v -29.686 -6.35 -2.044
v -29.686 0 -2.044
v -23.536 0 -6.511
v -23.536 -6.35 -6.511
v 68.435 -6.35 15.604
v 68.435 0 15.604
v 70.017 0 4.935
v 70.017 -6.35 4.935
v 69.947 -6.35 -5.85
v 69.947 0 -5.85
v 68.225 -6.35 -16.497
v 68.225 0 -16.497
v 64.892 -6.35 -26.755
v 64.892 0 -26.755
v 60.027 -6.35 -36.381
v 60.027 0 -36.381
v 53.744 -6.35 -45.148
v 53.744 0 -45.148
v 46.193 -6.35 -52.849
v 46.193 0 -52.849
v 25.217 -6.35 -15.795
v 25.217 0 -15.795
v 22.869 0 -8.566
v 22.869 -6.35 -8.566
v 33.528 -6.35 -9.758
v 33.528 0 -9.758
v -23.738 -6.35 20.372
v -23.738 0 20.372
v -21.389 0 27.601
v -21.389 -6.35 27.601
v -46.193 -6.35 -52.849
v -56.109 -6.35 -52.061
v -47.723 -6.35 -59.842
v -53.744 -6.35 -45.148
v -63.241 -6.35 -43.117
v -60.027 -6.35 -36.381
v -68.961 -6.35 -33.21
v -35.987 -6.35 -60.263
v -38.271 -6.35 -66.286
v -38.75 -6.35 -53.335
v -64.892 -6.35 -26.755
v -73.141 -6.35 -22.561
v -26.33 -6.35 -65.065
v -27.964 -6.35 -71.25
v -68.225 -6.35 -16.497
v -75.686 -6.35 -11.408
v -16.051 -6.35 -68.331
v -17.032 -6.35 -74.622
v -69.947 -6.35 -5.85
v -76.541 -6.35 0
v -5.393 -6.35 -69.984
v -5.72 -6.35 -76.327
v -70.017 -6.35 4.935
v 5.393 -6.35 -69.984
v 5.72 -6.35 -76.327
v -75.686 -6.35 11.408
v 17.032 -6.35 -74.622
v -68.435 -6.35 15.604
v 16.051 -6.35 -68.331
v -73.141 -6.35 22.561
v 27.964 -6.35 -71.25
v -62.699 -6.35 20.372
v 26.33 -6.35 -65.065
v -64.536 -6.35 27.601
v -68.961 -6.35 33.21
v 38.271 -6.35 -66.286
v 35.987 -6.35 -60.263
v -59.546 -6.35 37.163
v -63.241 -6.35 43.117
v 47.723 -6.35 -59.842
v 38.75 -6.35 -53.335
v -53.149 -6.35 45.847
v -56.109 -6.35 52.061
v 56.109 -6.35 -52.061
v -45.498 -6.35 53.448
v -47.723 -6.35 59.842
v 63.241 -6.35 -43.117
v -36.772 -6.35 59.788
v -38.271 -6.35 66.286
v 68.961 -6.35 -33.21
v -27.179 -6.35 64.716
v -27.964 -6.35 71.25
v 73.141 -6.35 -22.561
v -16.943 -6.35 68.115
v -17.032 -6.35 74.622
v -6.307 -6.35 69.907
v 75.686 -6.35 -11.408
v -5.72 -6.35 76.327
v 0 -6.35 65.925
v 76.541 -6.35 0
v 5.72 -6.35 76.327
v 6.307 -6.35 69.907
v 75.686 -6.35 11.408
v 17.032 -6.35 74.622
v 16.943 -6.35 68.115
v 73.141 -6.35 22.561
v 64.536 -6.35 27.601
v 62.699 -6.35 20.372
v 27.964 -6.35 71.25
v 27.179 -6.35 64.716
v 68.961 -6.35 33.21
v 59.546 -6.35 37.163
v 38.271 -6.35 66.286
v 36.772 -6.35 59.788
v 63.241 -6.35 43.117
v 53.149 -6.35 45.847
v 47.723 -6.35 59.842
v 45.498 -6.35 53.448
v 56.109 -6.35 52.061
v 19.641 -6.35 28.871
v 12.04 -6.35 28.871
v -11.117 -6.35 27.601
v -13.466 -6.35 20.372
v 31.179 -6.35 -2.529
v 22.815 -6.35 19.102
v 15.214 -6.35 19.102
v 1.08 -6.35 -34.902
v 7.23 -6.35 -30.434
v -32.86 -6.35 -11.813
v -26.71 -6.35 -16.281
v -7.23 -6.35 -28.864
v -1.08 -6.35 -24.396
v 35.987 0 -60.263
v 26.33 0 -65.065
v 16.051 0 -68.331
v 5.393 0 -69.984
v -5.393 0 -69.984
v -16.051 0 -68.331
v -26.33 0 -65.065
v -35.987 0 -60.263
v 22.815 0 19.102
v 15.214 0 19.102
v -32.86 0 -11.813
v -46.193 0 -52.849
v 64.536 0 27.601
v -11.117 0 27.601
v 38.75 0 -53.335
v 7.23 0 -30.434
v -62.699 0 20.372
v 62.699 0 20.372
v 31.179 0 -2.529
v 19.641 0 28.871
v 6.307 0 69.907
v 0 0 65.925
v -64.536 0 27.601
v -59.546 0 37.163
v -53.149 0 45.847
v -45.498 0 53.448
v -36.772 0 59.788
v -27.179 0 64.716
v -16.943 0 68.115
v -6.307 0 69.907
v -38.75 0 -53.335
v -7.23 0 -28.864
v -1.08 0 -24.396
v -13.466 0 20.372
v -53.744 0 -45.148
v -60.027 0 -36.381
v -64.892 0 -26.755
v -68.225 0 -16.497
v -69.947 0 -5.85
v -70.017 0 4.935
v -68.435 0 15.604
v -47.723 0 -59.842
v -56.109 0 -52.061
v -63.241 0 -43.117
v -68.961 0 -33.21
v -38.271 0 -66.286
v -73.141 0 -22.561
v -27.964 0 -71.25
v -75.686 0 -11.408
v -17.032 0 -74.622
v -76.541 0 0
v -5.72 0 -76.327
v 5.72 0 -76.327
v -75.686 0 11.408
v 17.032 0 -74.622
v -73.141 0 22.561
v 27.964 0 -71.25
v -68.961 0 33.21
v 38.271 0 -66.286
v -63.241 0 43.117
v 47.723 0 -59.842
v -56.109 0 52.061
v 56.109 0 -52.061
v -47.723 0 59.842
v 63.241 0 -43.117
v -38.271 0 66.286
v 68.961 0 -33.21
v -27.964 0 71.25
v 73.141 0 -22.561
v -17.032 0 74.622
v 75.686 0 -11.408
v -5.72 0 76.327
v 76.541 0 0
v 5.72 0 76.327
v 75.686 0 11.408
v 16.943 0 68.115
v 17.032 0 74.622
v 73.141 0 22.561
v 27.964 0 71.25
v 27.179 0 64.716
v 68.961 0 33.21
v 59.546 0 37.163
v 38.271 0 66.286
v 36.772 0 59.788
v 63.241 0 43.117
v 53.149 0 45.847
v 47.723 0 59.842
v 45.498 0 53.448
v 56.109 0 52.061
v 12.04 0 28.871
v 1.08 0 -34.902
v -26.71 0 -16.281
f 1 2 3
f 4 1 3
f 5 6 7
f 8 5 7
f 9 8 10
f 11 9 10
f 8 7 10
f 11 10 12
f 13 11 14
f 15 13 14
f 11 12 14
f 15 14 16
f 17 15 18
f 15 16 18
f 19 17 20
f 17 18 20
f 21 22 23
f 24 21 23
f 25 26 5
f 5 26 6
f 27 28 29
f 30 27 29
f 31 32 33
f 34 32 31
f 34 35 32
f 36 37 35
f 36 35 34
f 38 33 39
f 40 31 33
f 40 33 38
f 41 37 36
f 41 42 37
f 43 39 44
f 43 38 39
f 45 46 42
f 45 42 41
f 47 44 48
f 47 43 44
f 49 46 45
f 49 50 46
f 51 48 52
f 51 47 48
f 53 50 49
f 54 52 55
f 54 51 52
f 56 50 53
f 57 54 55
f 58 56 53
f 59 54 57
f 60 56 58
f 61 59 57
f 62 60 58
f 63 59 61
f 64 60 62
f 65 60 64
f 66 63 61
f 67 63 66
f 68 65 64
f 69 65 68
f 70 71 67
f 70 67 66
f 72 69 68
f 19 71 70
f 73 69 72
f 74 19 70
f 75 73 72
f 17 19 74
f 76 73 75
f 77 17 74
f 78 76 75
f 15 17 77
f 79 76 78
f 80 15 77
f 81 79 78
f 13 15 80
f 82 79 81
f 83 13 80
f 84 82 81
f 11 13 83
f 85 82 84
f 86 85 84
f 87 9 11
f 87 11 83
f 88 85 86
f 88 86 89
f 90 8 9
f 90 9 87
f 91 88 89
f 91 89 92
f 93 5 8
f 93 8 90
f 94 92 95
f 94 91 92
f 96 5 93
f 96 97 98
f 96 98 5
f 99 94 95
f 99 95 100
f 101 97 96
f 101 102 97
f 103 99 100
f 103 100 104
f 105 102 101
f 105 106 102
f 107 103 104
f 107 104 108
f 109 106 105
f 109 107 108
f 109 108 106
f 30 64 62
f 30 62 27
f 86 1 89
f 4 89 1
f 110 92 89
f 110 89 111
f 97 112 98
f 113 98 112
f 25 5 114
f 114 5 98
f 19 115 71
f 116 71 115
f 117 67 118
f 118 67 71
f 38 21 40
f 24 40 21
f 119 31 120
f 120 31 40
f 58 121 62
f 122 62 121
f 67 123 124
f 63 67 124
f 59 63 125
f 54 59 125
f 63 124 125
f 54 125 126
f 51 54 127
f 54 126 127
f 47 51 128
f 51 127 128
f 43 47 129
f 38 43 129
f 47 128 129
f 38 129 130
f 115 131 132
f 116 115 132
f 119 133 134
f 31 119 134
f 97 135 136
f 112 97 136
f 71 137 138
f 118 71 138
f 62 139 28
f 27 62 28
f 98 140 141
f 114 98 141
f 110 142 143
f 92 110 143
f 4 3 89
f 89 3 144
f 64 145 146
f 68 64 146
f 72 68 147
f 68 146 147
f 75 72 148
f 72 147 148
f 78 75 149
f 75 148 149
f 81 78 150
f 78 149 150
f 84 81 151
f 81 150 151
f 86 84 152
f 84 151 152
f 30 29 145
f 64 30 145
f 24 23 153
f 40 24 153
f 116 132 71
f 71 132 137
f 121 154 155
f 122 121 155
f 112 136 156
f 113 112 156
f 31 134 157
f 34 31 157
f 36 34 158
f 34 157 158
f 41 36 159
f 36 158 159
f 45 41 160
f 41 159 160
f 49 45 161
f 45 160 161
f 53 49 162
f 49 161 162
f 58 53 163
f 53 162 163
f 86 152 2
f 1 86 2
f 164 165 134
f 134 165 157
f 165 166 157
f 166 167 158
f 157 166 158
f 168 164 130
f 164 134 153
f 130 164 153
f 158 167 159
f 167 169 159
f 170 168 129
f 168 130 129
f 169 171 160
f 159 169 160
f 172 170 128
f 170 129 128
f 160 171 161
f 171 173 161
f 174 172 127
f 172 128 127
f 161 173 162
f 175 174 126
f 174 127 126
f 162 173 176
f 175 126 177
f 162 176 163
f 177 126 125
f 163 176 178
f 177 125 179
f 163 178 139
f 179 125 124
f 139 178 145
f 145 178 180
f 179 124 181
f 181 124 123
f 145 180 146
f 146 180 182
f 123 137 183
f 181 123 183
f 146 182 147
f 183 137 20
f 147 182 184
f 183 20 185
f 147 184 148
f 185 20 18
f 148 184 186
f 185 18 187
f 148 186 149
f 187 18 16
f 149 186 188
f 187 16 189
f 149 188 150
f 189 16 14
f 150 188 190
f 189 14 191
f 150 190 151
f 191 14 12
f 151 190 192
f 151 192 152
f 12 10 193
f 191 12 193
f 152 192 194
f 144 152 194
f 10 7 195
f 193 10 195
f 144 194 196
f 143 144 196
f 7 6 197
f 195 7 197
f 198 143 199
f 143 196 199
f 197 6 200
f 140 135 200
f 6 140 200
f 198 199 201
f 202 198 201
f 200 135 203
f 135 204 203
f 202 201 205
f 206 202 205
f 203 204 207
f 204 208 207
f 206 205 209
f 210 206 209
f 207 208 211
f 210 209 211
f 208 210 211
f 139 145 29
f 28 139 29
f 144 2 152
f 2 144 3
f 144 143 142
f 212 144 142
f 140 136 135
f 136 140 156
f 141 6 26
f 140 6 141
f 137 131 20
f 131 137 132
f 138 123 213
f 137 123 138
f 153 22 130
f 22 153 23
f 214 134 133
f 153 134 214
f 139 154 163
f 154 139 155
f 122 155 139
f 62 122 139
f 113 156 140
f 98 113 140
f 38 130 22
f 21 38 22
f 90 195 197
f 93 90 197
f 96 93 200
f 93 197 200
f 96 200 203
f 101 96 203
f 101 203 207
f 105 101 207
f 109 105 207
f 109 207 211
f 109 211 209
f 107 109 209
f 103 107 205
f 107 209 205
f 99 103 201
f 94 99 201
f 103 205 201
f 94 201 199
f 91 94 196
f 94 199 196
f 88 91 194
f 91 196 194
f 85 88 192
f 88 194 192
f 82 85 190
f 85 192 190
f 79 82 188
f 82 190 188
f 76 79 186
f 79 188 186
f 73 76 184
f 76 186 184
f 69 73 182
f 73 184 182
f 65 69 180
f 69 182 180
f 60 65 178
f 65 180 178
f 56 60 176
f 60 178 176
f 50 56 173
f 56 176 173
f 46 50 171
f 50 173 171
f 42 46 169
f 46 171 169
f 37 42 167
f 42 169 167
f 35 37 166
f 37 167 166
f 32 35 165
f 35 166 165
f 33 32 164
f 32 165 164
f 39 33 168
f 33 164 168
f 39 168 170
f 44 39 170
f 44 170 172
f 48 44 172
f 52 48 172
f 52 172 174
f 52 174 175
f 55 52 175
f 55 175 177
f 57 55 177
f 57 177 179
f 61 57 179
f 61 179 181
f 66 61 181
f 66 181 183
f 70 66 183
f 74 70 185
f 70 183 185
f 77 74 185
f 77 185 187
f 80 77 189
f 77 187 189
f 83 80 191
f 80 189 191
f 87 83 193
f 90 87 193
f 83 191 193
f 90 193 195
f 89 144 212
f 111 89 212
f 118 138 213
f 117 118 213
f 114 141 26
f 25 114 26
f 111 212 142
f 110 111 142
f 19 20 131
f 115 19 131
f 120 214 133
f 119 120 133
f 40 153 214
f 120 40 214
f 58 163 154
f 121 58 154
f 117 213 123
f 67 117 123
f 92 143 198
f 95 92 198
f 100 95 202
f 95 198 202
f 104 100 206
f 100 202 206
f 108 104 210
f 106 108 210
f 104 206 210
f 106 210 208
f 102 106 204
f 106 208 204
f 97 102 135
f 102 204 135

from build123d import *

# Parameters (mm, degrees)
F0_R     = 76.541025
F1_DEPTH = 6.35


with BuildPart() as f1:
    # F0 (on Front) → F1 (new body)
    with BuildSketch(Plane.XZ):
        Circle(F0_R)
        with BuildLine():
            ThreePointArc((-64.53644, 27.601229), (-41.257249, 56.785732), (-6.307472, 69.907051))
            Line((-6.307472, 69.907051), (-29.685655, -2.043597))
            Line((-29.685655, -2.043597), (-23.536186, -6.511448))
            Line((-23.536186, -6.511448), (0, 65.925484))
            Line((0, 65.925484), (12.039657, 28.871229))
            Line((12.039657, 28.871229), (19.640819, 28.871229))
            Line((19.640819, 28.871229), (6.307472, 69.907051))
            ThreePointArc((6.307472, 69.907051), (41.257249, 56.785732), (64.53644, 27.601229))
            Line((64.53644, 27.601229), (-11.116948, 27.601229))
            Line((-11.116948, 27.601229), (-13.465836, 20.372095))
            Line((-13.465836, 20.372095), (62.698861, 20.372095))
            Line((62.698861, 20.372095), (31.17863, -2.528694))
            Line((31.17863, -2.528694), (33.527518, -9.757828))
            Line((33.527518, -9.757828), (68.434673, 15.603704))
            ThreePointArc((68.434673, 15.603704), (66.755632, -21.69022), (46.193186, -52.848553))
            Line((46.193186, -52.848553), (22.815003, 19.102095))
            Line((22.815003, 19.102095), (15.213841, 19.102095))
            Line((15.213841, 19.102095), (38.750027, -53.334837))
            Line((38.750027, -53.334837), (7.229796, -30.434048))
            Line((7.229796, -30.434048), (1.080327, -34.901899))
            Line((1.080327, -34.901899), (35.987481, -60.263432))
            ThreePointArc((35.987481, -60.263432), (0, -70.191025), (-35.987481, -60.263432))
            Line((-35.987481, -60.263432), (25.217396, -15.795485))
            Line((25.217396, -15.795485), (22.868507, -8.566351))
            Line((22.868507, -8.566351), (-38.750027, -53.334837))
            Line((-38.750027, -53.334837), (-26.71037, -16.280582))
            Line((-26.71037, -16.280582), (-32.859839, -11.812731))
            Line((-32.859839, -11.812731), (-46.193186, -52.848553))
            ThreePointArc((-46.193186, -52.848553), (-66.755632, -21.69022), (-68.434673, 15.603704))
            Line((-68.434673, 15.603704), (-7.229796, -28.864242))
            Line((-7.229796, -28.864242), (-1.080327, -24.396391))
            Line((-1.080327, -24.396391), (-62.698861, 20.372095))
            Line((-62.698861, 20.372095), (-23.737712, 20.372095))
            Line((-23.737712, 20.372095), (-21.388824, 27.601229))
            Line((-21.388824, 27.601229), (-64.53644, 27.601229))
        make_face(mode=Mode.SUBTRACT)
    extrude(amount=F1_DEPTH)


solid = f1.part
